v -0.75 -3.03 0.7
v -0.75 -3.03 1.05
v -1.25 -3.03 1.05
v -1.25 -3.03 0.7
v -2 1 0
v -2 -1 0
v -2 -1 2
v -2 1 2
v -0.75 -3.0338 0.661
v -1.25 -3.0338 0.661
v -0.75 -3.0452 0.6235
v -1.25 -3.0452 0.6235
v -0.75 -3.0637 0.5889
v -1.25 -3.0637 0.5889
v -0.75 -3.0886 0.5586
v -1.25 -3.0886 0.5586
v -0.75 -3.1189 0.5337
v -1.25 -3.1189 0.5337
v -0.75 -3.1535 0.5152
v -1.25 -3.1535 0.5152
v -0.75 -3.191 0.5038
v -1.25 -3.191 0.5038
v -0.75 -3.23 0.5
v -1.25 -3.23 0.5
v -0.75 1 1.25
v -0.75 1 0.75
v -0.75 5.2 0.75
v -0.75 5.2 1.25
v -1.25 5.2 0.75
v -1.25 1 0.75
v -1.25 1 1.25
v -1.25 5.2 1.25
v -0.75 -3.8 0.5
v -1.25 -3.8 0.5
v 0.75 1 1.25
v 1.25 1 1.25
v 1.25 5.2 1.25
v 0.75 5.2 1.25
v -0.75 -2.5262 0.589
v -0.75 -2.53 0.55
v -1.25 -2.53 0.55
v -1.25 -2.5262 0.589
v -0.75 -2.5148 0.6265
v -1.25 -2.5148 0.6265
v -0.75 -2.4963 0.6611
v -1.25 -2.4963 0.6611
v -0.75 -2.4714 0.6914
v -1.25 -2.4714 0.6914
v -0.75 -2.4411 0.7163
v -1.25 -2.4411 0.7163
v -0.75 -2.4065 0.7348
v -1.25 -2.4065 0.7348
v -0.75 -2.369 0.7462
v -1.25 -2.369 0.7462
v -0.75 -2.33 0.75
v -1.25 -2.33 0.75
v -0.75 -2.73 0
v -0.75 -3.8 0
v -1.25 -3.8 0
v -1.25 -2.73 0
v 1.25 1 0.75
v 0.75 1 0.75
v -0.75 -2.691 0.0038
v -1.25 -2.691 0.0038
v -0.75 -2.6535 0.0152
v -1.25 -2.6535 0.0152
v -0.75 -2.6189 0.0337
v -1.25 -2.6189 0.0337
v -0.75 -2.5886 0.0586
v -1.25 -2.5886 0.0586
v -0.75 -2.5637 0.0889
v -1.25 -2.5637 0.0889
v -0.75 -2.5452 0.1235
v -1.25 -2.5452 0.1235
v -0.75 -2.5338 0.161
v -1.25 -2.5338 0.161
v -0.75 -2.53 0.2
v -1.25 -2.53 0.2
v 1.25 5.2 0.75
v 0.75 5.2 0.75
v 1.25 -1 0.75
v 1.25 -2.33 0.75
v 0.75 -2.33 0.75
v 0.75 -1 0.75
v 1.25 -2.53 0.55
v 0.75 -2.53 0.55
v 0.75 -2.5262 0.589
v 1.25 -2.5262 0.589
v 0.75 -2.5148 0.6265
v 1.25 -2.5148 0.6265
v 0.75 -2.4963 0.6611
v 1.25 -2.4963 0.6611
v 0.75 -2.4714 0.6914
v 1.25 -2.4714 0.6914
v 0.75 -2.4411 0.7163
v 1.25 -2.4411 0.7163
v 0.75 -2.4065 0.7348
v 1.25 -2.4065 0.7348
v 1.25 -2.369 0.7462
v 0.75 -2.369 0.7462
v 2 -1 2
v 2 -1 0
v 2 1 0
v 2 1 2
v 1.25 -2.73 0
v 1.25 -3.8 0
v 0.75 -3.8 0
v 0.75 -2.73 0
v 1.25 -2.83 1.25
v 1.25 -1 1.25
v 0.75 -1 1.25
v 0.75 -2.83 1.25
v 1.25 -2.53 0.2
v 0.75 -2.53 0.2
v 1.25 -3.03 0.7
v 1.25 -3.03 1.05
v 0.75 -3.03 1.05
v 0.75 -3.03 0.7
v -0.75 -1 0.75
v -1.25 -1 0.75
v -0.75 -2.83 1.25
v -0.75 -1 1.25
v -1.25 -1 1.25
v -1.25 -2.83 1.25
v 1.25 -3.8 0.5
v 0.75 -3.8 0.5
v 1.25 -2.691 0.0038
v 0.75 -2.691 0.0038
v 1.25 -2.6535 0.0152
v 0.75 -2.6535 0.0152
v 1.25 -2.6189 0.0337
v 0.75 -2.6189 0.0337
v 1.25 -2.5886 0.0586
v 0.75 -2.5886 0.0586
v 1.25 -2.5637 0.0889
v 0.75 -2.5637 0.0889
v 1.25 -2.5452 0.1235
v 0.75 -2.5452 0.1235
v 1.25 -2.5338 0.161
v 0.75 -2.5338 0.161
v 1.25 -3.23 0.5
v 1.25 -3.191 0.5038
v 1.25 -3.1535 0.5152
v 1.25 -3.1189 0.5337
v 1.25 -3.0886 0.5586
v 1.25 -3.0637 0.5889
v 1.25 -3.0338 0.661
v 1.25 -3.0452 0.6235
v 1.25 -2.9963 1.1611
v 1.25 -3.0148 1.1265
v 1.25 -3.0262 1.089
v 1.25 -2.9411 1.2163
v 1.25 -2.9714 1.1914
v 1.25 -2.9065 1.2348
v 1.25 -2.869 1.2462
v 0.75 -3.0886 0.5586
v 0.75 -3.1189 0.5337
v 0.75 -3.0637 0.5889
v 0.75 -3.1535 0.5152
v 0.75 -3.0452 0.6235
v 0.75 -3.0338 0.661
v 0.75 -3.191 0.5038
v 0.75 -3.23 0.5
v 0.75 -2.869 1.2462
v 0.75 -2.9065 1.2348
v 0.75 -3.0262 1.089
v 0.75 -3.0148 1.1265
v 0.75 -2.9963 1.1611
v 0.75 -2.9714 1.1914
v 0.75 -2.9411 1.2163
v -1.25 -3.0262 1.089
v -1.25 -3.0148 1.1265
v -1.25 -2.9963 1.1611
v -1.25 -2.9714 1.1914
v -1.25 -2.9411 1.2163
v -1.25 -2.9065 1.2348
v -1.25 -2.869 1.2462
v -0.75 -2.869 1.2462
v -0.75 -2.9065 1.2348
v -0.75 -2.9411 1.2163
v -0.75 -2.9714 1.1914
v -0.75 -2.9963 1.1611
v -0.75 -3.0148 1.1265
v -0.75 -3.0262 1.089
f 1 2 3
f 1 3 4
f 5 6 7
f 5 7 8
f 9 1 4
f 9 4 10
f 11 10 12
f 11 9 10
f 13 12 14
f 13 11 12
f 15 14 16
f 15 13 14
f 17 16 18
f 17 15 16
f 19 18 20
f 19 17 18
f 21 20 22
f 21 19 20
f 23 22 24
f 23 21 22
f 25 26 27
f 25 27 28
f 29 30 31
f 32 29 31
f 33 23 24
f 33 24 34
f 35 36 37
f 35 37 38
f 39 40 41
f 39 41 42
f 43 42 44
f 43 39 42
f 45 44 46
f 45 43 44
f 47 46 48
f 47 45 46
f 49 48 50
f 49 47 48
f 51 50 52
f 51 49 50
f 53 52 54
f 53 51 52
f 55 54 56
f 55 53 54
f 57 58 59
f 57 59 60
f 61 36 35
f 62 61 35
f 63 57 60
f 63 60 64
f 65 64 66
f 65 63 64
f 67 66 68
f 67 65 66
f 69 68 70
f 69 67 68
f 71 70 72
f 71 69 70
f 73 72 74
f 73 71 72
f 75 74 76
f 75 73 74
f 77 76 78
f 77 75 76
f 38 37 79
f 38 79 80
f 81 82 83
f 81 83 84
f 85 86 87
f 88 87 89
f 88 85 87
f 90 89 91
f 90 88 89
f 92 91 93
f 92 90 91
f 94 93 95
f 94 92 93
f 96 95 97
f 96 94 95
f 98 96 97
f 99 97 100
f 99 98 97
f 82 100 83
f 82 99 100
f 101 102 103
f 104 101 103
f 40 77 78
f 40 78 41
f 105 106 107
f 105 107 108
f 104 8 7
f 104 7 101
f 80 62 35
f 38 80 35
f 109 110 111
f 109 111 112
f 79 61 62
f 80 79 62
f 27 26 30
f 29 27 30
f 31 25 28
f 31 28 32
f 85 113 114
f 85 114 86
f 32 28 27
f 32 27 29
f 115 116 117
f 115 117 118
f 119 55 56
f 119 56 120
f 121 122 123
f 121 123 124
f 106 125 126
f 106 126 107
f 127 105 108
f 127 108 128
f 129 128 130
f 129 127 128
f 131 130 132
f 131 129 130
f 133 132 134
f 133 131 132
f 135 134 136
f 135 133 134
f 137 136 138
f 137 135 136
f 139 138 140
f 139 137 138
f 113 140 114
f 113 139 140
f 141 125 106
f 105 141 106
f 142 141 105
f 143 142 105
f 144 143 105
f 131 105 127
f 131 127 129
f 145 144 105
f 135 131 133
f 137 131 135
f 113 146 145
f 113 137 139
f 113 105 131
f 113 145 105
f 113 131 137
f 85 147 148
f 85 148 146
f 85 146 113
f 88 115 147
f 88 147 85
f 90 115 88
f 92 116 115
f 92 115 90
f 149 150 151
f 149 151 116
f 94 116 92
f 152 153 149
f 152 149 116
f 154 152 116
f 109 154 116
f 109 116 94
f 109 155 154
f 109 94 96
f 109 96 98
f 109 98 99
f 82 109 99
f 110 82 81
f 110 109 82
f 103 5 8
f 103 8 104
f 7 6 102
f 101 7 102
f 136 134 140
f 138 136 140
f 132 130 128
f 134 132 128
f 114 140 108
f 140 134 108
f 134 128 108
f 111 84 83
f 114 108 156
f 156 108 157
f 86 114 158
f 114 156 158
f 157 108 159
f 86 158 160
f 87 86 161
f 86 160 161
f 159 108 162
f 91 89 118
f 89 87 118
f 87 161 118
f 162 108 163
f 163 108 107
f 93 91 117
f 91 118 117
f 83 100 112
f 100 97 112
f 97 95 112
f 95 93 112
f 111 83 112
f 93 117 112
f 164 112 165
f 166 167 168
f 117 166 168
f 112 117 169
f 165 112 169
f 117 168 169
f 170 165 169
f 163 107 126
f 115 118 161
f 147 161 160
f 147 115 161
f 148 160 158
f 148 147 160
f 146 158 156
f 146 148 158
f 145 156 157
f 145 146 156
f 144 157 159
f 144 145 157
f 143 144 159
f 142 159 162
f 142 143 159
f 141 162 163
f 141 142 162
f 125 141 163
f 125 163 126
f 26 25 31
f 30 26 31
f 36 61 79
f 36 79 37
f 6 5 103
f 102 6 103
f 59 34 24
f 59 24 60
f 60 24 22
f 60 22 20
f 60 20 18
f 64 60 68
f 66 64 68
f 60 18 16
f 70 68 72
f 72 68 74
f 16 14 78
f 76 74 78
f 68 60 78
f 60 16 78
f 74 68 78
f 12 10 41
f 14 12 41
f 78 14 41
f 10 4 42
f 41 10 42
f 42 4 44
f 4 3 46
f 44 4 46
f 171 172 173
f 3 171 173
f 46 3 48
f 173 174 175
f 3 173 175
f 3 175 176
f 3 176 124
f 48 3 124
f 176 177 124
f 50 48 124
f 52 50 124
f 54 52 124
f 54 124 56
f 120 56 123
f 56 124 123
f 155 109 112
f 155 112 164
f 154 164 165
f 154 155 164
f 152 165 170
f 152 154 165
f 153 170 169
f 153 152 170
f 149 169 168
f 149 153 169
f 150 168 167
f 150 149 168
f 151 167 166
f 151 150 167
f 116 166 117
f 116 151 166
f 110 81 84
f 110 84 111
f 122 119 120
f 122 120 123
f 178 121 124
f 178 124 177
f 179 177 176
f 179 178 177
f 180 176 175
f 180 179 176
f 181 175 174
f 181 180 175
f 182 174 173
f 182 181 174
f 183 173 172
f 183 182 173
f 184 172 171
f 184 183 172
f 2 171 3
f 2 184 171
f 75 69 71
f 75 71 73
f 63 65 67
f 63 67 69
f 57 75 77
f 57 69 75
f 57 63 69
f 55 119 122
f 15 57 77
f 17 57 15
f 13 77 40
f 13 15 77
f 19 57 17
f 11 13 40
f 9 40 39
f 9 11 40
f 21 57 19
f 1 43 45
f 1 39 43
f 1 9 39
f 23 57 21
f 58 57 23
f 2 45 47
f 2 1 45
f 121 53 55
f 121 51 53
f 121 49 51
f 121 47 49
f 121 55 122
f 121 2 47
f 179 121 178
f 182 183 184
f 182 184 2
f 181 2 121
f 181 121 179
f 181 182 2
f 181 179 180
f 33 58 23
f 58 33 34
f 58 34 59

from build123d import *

# Parameters (mm, degrees)
F0_W     = 4
F0_H     = 2
F1_DEPTH = 2
F2_W     = 0.5
F2_H     = 0.5
F3_DEPTH = 4.2
F5_DEPTH = 2.5
F6_W     = 1.5
F6_H     = 1.436406
F7_DEPTH = 2.8


with BuildPart() as f1:
    # F0 (on Top) → F1 (new body)
    with BuildSketch(Plane.XY):
        Rectangle(F0_W, F0_H)
    extrude(amount=F1_DEPTH)


with BuildPart() as f3:
    # F2 (on face) → F3 (new body)
    with BuildSketch(Plane(origin=(0, 1, 0), x_dir=(-1, 0, 0), z_dir=(0, 1, 0))):
        with Locations((-1, 1)):
            Rectangle(F2_W, F2_H)
        with Locations((1, 1)):
            Rectangle(F2_W, F2_H)
    extrude(amount=F3_DEPTH)


with BuildPart() as f5:
    # F4 (on face) → F5 (new body)
    with BuildSketch(Plane.YZ.offset(1.25)):
        with BuildLine():
            Line((-2.33, 0.75), (-1, 0.75))
            Line((-1, 0.75), (-1, 1.25))
            Line((-1, 1.25), (-2.53, 1.25))
            Line((-2.53, 1.25), (-2.83, 1.25))
            ThreePointArc((-2.83, 1.25), (-2.971421, 1.191421), (-3.03, 1.05))
            Line((-3.03, 1.05), (-3.03, 0.7))
            ThreePointArc((-3.03, 0.7), (-3.088579, 0.558579), (-3.23, 0.5))
            Line((-3.23, 0.5), (-3.8, 0.5))
            Line((-3.8, 0.5), (-3.8, 0))
            Line((-3.8, 0), (-2.73, 0))
            ThreePointArc((-2.73, 0), (-2.588579, 0.058579), (-2.53, 0.2))
            Line((-2.53, 0.2), (-2.53, 0.55))
            ThreePointArc((-2.53, 0.55), (-2.471421, 0.691421), (-2.33, 0.75))
        make_face()
    extrude(amount=-F5_DEPTH)

    # F6 (on face) → F7 (cut)
    with BuildSketch(Plane.XZ.offset(3.8)):
        with Locations((0, 0.718203)):
            Rectangle(F6_W, F6_H)
    extrude(amount=-F7_DEPTH, mode=Mode.SUBTRACT)


solid = Compound([f1.part, f3.part, f5.part])
